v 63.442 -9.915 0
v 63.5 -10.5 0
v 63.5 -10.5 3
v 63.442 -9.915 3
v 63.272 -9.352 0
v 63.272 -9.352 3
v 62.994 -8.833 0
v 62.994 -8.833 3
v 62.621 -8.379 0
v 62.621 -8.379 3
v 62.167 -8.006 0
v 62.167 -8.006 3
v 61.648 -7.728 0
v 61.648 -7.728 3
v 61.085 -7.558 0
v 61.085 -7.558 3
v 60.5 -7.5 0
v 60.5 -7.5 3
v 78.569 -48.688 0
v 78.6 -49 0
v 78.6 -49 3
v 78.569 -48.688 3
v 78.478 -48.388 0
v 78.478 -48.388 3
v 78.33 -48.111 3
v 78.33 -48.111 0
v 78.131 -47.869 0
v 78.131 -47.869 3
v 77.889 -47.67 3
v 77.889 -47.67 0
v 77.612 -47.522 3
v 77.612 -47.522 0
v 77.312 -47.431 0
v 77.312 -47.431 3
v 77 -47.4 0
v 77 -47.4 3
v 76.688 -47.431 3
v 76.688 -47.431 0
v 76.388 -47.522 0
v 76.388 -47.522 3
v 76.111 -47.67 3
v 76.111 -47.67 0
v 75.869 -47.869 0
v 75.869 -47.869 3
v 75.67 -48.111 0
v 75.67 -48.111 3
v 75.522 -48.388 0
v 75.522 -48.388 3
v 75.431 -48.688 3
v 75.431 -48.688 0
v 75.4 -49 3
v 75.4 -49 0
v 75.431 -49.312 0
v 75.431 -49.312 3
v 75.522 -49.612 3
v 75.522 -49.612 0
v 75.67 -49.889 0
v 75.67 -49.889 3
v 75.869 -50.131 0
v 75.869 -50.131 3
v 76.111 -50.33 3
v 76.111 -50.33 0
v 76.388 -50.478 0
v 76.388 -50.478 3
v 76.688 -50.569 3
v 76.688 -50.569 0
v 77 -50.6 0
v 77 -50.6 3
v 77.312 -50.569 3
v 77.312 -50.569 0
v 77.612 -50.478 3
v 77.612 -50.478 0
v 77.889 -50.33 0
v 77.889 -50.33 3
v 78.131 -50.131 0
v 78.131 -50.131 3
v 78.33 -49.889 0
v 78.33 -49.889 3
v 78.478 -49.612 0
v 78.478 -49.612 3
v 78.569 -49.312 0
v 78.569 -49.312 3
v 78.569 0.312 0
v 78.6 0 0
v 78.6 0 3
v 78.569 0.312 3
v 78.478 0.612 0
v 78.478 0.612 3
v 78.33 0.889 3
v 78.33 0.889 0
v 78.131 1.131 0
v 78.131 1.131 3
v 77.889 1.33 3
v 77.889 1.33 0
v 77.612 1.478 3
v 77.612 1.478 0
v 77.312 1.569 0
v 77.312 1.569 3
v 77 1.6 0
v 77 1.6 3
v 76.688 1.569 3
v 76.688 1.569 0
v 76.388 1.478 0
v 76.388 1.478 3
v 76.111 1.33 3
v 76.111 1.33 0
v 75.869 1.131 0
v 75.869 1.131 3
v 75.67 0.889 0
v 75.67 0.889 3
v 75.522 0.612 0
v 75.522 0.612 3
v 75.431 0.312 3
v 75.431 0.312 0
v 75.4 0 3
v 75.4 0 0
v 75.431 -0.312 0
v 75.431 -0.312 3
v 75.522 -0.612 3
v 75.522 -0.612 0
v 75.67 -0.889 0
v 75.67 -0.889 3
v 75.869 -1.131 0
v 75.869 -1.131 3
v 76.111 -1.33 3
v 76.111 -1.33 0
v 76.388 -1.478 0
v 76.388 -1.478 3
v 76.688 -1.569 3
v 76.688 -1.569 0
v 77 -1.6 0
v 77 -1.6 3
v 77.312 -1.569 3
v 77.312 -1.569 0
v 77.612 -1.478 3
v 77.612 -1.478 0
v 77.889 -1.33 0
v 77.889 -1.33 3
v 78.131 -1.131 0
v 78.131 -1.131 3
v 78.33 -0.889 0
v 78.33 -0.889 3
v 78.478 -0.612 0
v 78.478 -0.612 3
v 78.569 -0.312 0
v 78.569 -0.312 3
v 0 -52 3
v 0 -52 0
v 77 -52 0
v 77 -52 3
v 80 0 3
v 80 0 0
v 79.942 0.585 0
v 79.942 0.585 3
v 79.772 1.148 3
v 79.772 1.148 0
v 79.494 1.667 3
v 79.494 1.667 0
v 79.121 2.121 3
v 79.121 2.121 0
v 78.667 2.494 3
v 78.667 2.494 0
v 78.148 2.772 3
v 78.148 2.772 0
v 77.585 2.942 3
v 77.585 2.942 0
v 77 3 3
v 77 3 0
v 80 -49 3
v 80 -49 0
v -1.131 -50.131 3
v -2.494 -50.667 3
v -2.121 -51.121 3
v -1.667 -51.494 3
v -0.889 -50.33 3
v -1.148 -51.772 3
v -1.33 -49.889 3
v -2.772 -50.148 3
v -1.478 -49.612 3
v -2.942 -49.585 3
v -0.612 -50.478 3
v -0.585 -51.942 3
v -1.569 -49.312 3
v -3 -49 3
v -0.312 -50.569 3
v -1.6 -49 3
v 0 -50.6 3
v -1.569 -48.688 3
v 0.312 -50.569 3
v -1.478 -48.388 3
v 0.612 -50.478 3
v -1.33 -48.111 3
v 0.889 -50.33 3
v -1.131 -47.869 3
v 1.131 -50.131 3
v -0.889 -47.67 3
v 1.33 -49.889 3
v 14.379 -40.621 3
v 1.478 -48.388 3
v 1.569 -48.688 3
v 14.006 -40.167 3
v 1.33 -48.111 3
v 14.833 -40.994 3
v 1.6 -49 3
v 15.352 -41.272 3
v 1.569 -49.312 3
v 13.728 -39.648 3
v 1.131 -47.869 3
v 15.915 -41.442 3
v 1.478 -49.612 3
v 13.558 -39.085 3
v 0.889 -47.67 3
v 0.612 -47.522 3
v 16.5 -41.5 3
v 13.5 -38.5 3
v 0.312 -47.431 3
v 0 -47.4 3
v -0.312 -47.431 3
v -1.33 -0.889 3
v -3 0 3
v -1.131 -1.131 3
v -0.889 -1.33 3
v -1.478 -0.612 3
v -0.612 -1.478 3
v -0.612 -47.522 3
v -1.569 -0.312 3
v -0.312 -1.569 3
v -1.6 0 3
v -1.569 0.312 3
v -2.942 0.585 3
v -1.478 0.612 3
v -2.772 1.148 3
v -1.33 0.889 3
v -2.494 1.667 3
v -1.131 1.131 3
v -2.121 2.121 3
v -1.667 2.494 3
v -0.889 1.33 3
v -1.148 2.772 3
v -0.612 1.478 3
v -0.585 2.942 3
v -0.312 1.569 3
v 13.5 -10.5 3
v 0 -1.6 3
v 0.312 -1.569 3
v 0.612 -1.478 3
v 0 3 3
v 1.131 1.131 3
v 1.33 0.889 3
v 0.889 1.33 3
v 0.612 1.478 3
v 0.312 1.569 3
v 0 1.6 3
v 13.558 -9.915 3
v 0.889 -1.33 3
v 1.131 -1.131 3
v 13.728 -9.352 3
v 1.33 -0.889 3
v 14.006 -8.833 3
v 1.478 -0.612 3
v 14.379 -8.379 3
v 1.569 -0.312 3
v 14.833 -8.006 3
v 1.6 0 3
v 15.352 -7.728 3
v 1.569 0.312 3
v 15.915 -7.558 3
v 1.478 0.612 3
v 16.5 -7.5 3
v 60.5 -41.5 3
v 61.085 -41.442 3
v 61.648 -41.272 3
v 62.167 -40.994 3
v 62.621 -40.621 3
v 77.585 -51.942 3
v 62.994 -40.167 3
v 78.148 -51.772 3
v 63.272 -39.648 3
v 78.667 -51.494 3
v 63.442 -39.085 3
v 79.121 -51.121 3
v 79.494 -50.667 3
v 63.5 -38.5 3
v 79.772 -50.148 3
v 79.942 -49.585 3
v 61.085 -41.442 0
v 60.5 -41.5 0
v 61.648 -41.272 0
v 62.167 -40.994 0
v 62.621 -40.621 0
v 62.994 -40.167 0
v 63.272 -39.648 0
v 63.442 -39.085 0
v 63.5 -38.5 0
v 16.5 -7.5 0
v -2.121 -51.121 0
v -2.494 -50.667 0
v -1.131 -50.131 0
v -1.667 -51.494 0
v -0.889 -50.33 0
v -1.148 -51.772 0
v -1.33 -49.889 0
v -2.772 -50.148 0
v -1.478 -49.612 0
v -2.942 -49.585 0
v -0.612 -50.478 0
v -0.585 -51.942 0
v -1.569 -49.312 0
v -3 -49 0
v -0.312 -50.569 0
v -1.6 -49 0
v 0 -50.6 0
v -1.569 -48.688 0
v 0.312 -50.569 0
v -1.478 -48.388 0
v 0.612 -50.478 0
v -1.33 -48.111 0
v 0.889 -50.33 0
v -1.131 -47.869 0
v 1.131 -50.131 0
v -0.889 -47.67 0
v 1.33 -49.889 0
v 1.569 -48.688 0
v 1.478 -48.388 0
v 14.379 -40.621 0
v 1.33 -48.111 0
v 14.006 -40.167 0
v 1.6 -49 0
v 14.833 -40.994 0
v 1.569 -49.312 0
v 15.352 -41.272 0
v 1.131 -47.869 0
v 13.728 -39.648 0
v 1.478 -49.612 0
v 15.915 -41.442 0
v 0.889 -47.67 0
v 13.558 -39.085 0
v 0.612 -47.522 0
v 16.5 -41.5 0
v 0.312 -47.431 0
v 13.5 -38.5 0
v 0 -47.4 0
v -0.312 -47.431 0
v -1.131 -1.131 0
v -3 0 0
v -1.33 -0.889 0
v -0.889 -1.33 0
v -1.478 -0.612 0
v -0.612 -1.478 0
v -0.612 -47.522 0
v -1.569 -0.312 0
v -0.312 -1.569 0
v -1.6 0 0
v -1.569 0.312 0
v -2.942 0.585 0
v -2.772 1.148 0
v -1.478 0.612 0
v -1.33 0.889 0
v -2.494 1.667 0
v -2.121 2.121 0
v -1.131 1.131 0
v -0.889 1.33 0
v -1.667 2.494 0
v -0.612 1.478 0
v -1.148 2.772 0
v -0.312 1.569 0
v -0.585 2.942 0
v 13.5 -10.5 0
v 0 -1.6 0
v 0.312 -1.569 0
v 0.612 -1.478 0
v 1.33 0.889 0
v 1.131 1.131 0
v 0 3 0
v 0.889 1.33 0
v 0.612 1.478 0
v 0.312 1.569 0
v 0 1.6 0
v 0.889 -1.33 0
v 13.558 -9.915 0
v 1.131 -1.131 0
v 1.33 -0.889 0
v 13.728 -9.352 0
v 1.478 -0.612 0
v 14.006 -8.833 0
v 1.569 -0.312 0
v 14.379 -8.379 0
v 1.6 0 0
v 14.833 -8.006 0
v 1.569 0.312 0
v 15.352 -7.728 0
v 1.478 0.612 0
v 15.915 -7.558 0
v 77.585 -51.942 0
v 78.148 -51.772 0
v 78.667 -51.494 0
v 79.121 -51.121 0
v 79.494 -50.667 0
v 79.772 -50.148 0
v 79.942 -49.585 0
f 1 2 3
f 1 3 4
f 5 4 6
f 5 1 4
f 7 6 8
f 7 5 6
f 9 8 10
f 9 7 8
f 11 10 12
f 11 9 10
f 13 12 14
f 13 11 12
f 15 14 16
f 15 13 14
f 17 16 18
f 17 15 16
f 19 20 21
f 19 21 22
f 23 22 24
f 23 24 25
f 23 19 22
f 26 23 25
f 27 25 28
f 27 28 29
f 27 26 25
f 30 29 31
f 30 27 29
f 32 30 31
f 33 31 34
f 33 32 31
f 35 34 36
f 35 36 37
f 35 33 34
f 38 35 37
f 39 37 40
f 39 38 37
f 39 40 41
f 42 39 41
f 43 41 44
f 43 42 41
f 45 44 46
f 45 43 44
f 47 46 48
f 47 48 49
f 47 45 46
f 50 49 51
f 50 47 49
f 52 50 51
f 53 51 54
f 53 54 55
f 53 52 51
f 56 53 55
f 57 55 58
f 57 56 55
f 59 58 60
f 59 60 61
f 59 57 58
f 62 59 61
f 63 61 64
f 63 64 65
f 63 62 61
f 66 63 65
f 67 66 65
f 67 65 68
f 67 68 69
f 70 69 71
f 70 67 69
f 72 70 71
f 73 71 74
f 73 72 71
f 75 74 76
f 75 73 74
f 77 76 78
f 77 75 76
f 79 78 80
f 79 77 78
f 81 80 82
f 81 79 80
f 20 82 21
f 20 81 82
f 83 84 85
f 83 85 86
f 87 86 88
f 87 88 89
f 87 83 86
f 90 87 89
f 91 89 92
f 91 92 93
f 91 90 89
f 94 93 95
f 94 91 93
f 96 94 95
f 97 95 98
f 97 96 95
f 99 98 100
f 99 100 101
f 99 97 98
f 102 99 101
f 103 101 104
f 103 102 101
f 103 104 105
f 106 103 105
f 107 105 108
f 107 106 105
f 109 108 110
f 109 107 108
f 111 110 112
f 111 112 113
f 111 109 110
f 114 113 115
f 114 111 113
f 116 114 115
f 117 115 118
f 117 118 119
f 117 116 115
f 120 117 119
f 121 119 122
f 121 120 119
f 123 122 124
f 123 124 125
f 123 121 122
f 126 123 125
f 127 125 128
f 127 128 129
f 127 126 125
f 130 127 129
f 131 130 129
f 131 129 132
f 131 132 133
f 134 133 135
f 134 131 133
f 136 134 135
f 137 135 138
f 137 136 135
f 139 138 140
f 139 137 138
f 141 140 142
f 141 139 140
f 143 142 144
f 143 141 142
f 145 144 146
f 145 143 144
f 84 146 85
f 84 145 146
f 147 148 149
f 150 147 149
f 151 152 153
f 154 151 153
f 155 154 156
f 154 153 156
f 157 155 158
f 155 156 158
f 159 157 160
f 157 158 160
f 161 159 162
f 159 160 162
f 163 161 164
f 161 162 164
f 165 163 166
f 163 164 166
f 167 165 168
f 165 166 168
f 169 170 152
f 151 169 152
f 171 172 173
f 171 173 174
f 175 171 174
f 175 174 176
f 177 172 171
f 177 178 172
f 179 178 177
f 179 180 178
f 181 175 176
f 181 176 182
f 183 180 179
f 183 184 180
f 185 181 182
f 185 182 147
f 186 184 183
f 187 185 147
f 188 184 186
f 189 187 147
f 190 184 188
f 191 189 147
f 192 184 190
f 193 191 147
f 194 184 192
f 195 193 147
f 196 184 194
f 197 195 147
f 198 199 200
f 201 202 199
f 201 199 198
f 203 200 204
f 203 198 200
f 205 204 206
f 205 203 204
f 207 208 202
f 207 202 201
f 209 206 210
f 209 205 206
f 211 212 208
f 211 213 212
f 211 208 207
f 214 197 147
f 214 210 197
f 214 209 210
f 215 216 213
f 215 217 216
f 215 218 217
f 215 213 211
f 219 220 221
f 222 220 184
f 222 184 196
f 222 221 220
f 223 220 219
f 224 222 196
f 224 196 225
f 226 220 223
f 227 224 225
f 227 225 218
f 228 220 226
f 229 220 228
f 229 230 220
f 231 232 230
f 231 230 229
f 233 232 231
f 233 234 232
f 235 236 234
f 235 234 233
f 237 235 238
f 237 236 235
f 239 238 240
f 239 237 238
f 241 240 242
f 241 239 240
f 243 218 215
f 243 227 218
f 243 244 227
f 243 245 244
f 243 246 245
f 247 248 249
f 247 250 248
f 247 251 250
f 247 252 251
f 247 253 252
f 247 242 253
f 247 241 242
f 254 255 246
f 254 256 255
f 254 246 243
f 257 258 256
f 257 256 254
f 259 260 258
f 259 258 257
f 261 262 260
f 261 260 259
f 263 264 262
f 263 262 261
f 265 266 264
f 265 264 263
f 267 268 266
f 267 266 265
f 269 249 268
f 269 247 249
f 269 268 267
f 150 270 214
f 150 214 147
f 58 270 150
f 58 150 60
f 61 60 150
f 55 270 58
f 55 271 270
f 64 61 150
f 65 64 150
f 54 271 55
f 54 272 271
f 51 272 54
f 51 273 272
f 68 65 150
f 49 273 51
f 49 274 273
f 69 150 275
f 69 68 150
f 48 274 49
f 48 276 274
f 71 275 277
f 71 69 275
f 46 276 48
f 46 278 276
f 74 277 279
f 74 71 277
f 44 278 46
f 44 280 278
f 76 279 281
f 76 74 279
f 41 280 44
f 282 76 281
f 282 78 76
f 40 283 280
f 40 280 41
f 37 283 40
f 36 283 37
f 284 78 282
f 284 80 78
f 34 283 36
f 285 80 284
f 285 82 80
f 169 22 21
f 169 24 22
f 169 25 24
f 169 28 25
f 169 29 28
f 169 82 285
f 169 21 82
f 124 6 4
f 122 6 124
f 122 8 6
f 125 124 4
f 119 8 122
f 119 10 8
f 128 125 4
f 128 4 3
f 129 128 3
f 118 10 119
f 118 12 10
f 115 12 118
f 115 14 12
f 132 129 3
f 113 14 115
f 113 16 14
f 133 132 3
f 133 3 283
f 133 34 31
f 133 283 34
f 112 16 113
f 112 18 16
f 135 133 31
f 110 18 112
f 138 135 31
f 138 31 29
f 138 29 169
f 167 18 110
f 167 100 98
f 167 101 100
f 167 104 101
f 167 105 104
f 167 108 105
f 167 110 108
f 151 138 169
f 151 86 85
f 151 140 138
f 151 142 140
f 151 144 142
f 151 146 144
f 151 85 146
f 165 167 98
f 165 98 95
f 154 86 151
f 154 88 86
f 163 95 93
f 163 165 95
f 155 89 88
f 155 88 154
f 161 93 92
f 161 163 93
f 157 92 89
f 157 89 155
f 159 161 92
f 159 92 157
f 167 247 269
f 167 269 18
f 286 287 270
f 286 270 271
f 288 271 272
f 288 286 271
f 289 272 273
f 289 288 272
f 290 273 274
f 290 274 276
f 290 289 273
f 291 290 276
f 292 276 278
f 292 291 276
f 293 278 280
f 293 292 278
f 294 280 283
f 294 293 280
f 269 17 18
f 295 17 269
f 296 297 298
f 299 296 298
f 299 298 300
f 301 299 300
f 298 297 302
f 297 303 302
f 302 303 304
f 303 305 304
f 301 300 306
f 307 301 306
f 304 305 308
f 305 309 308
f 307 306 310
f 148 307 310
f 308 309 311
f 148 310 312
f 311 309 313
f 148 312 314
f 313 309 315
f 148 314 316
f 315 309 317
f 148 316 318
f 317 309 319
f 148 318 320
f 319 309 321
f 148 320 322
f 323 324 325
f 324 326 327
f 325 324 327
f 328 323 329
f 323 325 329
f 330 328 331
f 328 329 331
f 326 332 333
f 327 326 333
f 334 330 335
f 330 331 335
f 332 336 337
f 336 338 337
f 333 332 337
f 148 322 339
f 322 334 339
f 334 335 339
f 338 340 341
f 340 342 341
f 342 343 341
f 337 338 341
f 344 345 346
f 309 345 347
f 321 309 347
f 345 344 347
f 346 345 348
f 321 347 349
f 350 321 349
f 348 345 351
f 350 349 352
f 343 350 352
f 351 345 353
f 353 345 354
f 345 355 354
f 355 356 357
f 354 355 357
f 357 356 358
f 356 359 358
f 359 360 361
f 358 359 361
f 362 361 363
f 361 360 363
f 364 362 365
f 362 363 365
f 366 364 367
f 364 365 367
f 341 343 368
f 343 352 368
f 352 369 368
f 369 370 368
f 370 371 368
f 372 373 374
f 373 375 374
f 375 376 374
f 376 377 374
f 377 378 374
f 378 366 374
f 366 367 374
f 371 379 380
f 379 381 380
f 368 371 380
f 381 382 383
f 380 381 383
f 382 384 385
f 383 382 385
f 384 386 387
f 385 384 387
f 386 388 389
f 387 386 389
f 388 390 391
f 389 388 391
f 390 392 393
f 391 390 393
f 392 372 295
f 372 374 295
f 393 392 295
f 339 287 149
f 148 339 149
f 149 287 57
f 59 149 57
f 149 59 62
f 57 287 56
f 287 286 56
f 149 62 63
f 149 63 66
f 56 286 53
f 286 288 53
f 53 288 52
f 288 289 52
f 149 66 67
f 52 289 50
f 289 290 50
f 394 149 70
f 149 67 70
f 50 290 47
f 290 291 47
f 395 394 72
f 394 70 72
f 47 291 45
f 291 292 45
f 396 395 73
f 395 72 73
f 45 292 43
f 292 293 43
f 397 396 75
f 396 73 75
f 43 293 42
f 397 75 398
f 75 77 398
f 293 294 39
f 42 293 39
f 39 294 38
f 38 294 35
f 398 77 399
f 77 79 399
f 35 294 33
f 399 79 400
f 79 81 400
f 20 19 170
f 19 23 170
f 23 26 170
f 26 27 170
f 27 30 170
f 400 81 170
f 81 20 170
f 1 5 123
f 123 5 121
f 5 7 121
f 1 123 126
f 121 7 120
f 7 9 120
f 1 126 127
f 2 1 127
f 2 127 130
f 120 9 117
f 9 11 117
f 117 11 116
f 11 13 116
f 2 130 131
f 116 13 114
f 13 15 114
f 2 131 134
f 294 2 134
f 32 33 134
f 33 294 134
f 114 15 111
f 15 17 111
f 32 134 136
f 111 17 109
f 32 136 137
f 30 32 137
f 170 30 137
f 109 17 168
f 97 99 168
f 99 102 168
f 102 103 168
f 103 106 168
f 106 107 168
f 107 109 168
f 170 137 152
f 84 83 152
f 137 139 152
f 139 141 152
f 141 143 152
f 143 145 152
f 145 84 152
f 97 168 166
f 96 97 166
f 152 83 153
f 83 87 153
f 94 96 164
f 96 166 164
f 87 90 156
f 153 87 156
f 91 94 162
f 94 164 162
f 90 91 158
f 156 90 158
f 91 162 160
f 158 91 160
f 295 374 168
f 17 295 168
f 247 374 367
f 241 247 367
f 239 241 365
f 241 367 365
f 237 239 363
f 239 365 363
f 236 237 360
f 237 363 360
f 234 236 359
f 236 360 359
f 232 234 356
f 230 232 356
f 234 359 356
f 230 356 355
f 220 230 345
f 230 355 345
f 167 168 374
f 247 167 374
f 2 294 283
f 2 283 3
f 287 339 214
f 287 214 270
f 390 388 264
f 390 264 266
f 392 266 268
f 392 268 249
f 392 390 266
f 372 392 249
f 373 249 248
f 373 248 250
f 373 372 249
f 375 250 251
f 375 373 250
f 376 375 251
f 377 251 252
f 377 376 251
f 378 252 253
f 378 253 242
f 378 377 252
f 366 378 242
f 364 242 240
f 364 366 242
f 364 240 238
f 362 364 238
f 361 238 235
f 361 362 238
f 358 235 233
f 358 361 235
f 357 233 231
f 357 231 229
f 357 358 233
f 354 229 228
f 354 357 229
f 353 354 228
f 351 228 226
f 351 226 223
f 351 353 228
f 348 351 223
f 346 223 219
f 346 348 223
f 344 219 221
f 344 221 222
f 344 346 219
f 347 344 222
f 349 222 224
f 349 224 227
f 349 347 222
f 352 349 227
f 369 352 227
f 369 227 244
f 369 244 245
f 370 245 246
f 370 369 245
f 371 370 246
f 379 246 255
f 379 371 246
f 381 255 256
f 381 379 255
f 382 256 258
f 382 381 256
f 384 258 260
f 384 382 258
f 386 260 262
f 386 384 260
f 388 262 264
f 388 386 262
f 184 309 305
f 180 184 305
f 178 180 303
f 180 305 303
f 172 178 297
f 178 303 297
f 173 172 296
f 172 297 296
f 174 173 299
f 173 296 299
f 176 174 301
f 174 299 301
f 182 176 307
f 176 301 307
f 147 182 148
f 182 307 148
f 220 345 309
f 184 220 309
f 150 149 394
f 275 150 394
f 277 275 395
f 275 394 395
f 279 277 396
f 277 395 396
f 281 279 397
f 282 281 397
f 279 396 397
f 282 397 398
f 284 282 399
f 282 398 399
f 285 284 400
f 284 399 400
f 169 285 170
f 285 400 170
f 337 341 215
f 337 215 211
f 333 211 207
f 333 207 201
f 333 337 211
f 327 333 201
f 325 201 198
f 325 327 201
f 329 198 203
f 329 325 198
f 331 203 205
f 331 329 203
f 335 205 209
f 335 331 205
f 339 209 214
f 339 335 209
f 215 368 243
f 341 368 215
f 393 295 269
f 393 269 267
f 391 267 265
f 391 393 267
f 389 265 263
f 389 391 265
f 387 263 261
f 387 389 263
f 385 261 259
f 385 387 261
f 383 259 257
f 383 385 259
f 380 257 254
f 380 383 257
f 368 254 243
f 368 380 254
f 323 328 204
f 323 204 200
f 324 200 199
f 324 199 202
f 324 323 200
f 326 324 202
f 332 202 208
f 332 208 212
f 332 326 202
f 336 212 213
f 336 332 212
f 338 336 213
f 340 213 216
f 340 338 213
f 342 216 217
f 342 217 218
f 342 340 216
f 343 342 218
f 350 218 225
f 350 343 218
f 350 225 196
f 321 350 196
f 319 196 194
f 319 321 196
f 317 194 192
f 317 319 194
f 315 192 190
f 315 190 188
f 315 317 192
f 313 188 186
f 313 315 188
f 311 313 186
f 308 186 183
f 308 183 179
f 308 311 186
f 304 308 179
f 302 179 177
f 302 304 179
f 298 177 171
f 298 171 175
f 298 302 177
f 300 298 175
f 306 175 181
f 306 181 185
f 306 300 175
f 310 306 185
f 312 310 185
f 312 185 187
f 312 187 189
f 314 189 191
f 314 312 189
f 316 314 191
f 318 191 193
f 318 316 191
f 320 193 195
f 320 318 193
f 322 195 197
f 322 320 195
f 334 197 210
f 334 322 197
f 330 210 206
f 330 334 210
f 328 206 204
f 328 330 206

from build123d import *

# Parameters (mm, degrees)
SKETCH_1_R      = 1.6
EXTRUDE_1_DEPTH = 3


with BuildPart() as part:
    # 草图1 → 凸台-拉伸1 (new body)
    with BuildSketch(Plane.XY):
        with BuildLine():
            Line((0, -52), (77, -52))
            ThreePointArc((77, -52), (79.121320344, -51.121320344), (80, -49))
            Line((80, -49), (80, 0))
            ThreePointArc((80, 0), (79.121320344, 2.121320344), (77, 3))
            Line((77, 3), (0, 3))
            ThreePointArc((0, 3), (-2.121320344, 2.121320344), (-3, 0))
            Line((-3, 0), (-3, -49))
            ThreePointArc((-3, -49), (-2.121320344, -51.121320344), (0, -52))
        make_face()
        Circle(SKETCH_1_R, mode=Mode.SUBTRACT)
        with Locations((77, 0)):
            Circle(SKETCH_1_R, mode=Mode.SUBTRACT)
        with Locations((0, -49)):
            Circle(SKETCH_1_R, mode=Mode.SUBTRACT)
        with Locations((77, -49)):
            Circle(SKETCH_1_R, mode=Mode.SUBTRACT)
        with BuildLine():
            Line((16.5, -41.5), (60.5, -41.5))
            ThreePointArc((60.5, -41.5), (62.621320344, -40.621320344), (63.5, -38.5))
            Line((63.5, -38.5), (63.5, -10.5))
            ThreePointArc((63.5, -10.5), (62.621320344, -8.378679656), (60.5, -7.5))
            Line((60.5, -7.5), (16.5, -7.5))
            ThreePointArc((16.5, -7.5), (14.378679656, -8.378679656), (13.5, -10.5))
            Line((13.5, -10.5), (13.5, -38.5))
            ThreePointArc((13.5, -38.5), (14.378679656, -40.621320344), (16.5, -41.5))
        make_face(mode=Mode.SUBTRACT)
    extrude(amount=EXTRUDE_1_DEPTH)


solid = part.part
